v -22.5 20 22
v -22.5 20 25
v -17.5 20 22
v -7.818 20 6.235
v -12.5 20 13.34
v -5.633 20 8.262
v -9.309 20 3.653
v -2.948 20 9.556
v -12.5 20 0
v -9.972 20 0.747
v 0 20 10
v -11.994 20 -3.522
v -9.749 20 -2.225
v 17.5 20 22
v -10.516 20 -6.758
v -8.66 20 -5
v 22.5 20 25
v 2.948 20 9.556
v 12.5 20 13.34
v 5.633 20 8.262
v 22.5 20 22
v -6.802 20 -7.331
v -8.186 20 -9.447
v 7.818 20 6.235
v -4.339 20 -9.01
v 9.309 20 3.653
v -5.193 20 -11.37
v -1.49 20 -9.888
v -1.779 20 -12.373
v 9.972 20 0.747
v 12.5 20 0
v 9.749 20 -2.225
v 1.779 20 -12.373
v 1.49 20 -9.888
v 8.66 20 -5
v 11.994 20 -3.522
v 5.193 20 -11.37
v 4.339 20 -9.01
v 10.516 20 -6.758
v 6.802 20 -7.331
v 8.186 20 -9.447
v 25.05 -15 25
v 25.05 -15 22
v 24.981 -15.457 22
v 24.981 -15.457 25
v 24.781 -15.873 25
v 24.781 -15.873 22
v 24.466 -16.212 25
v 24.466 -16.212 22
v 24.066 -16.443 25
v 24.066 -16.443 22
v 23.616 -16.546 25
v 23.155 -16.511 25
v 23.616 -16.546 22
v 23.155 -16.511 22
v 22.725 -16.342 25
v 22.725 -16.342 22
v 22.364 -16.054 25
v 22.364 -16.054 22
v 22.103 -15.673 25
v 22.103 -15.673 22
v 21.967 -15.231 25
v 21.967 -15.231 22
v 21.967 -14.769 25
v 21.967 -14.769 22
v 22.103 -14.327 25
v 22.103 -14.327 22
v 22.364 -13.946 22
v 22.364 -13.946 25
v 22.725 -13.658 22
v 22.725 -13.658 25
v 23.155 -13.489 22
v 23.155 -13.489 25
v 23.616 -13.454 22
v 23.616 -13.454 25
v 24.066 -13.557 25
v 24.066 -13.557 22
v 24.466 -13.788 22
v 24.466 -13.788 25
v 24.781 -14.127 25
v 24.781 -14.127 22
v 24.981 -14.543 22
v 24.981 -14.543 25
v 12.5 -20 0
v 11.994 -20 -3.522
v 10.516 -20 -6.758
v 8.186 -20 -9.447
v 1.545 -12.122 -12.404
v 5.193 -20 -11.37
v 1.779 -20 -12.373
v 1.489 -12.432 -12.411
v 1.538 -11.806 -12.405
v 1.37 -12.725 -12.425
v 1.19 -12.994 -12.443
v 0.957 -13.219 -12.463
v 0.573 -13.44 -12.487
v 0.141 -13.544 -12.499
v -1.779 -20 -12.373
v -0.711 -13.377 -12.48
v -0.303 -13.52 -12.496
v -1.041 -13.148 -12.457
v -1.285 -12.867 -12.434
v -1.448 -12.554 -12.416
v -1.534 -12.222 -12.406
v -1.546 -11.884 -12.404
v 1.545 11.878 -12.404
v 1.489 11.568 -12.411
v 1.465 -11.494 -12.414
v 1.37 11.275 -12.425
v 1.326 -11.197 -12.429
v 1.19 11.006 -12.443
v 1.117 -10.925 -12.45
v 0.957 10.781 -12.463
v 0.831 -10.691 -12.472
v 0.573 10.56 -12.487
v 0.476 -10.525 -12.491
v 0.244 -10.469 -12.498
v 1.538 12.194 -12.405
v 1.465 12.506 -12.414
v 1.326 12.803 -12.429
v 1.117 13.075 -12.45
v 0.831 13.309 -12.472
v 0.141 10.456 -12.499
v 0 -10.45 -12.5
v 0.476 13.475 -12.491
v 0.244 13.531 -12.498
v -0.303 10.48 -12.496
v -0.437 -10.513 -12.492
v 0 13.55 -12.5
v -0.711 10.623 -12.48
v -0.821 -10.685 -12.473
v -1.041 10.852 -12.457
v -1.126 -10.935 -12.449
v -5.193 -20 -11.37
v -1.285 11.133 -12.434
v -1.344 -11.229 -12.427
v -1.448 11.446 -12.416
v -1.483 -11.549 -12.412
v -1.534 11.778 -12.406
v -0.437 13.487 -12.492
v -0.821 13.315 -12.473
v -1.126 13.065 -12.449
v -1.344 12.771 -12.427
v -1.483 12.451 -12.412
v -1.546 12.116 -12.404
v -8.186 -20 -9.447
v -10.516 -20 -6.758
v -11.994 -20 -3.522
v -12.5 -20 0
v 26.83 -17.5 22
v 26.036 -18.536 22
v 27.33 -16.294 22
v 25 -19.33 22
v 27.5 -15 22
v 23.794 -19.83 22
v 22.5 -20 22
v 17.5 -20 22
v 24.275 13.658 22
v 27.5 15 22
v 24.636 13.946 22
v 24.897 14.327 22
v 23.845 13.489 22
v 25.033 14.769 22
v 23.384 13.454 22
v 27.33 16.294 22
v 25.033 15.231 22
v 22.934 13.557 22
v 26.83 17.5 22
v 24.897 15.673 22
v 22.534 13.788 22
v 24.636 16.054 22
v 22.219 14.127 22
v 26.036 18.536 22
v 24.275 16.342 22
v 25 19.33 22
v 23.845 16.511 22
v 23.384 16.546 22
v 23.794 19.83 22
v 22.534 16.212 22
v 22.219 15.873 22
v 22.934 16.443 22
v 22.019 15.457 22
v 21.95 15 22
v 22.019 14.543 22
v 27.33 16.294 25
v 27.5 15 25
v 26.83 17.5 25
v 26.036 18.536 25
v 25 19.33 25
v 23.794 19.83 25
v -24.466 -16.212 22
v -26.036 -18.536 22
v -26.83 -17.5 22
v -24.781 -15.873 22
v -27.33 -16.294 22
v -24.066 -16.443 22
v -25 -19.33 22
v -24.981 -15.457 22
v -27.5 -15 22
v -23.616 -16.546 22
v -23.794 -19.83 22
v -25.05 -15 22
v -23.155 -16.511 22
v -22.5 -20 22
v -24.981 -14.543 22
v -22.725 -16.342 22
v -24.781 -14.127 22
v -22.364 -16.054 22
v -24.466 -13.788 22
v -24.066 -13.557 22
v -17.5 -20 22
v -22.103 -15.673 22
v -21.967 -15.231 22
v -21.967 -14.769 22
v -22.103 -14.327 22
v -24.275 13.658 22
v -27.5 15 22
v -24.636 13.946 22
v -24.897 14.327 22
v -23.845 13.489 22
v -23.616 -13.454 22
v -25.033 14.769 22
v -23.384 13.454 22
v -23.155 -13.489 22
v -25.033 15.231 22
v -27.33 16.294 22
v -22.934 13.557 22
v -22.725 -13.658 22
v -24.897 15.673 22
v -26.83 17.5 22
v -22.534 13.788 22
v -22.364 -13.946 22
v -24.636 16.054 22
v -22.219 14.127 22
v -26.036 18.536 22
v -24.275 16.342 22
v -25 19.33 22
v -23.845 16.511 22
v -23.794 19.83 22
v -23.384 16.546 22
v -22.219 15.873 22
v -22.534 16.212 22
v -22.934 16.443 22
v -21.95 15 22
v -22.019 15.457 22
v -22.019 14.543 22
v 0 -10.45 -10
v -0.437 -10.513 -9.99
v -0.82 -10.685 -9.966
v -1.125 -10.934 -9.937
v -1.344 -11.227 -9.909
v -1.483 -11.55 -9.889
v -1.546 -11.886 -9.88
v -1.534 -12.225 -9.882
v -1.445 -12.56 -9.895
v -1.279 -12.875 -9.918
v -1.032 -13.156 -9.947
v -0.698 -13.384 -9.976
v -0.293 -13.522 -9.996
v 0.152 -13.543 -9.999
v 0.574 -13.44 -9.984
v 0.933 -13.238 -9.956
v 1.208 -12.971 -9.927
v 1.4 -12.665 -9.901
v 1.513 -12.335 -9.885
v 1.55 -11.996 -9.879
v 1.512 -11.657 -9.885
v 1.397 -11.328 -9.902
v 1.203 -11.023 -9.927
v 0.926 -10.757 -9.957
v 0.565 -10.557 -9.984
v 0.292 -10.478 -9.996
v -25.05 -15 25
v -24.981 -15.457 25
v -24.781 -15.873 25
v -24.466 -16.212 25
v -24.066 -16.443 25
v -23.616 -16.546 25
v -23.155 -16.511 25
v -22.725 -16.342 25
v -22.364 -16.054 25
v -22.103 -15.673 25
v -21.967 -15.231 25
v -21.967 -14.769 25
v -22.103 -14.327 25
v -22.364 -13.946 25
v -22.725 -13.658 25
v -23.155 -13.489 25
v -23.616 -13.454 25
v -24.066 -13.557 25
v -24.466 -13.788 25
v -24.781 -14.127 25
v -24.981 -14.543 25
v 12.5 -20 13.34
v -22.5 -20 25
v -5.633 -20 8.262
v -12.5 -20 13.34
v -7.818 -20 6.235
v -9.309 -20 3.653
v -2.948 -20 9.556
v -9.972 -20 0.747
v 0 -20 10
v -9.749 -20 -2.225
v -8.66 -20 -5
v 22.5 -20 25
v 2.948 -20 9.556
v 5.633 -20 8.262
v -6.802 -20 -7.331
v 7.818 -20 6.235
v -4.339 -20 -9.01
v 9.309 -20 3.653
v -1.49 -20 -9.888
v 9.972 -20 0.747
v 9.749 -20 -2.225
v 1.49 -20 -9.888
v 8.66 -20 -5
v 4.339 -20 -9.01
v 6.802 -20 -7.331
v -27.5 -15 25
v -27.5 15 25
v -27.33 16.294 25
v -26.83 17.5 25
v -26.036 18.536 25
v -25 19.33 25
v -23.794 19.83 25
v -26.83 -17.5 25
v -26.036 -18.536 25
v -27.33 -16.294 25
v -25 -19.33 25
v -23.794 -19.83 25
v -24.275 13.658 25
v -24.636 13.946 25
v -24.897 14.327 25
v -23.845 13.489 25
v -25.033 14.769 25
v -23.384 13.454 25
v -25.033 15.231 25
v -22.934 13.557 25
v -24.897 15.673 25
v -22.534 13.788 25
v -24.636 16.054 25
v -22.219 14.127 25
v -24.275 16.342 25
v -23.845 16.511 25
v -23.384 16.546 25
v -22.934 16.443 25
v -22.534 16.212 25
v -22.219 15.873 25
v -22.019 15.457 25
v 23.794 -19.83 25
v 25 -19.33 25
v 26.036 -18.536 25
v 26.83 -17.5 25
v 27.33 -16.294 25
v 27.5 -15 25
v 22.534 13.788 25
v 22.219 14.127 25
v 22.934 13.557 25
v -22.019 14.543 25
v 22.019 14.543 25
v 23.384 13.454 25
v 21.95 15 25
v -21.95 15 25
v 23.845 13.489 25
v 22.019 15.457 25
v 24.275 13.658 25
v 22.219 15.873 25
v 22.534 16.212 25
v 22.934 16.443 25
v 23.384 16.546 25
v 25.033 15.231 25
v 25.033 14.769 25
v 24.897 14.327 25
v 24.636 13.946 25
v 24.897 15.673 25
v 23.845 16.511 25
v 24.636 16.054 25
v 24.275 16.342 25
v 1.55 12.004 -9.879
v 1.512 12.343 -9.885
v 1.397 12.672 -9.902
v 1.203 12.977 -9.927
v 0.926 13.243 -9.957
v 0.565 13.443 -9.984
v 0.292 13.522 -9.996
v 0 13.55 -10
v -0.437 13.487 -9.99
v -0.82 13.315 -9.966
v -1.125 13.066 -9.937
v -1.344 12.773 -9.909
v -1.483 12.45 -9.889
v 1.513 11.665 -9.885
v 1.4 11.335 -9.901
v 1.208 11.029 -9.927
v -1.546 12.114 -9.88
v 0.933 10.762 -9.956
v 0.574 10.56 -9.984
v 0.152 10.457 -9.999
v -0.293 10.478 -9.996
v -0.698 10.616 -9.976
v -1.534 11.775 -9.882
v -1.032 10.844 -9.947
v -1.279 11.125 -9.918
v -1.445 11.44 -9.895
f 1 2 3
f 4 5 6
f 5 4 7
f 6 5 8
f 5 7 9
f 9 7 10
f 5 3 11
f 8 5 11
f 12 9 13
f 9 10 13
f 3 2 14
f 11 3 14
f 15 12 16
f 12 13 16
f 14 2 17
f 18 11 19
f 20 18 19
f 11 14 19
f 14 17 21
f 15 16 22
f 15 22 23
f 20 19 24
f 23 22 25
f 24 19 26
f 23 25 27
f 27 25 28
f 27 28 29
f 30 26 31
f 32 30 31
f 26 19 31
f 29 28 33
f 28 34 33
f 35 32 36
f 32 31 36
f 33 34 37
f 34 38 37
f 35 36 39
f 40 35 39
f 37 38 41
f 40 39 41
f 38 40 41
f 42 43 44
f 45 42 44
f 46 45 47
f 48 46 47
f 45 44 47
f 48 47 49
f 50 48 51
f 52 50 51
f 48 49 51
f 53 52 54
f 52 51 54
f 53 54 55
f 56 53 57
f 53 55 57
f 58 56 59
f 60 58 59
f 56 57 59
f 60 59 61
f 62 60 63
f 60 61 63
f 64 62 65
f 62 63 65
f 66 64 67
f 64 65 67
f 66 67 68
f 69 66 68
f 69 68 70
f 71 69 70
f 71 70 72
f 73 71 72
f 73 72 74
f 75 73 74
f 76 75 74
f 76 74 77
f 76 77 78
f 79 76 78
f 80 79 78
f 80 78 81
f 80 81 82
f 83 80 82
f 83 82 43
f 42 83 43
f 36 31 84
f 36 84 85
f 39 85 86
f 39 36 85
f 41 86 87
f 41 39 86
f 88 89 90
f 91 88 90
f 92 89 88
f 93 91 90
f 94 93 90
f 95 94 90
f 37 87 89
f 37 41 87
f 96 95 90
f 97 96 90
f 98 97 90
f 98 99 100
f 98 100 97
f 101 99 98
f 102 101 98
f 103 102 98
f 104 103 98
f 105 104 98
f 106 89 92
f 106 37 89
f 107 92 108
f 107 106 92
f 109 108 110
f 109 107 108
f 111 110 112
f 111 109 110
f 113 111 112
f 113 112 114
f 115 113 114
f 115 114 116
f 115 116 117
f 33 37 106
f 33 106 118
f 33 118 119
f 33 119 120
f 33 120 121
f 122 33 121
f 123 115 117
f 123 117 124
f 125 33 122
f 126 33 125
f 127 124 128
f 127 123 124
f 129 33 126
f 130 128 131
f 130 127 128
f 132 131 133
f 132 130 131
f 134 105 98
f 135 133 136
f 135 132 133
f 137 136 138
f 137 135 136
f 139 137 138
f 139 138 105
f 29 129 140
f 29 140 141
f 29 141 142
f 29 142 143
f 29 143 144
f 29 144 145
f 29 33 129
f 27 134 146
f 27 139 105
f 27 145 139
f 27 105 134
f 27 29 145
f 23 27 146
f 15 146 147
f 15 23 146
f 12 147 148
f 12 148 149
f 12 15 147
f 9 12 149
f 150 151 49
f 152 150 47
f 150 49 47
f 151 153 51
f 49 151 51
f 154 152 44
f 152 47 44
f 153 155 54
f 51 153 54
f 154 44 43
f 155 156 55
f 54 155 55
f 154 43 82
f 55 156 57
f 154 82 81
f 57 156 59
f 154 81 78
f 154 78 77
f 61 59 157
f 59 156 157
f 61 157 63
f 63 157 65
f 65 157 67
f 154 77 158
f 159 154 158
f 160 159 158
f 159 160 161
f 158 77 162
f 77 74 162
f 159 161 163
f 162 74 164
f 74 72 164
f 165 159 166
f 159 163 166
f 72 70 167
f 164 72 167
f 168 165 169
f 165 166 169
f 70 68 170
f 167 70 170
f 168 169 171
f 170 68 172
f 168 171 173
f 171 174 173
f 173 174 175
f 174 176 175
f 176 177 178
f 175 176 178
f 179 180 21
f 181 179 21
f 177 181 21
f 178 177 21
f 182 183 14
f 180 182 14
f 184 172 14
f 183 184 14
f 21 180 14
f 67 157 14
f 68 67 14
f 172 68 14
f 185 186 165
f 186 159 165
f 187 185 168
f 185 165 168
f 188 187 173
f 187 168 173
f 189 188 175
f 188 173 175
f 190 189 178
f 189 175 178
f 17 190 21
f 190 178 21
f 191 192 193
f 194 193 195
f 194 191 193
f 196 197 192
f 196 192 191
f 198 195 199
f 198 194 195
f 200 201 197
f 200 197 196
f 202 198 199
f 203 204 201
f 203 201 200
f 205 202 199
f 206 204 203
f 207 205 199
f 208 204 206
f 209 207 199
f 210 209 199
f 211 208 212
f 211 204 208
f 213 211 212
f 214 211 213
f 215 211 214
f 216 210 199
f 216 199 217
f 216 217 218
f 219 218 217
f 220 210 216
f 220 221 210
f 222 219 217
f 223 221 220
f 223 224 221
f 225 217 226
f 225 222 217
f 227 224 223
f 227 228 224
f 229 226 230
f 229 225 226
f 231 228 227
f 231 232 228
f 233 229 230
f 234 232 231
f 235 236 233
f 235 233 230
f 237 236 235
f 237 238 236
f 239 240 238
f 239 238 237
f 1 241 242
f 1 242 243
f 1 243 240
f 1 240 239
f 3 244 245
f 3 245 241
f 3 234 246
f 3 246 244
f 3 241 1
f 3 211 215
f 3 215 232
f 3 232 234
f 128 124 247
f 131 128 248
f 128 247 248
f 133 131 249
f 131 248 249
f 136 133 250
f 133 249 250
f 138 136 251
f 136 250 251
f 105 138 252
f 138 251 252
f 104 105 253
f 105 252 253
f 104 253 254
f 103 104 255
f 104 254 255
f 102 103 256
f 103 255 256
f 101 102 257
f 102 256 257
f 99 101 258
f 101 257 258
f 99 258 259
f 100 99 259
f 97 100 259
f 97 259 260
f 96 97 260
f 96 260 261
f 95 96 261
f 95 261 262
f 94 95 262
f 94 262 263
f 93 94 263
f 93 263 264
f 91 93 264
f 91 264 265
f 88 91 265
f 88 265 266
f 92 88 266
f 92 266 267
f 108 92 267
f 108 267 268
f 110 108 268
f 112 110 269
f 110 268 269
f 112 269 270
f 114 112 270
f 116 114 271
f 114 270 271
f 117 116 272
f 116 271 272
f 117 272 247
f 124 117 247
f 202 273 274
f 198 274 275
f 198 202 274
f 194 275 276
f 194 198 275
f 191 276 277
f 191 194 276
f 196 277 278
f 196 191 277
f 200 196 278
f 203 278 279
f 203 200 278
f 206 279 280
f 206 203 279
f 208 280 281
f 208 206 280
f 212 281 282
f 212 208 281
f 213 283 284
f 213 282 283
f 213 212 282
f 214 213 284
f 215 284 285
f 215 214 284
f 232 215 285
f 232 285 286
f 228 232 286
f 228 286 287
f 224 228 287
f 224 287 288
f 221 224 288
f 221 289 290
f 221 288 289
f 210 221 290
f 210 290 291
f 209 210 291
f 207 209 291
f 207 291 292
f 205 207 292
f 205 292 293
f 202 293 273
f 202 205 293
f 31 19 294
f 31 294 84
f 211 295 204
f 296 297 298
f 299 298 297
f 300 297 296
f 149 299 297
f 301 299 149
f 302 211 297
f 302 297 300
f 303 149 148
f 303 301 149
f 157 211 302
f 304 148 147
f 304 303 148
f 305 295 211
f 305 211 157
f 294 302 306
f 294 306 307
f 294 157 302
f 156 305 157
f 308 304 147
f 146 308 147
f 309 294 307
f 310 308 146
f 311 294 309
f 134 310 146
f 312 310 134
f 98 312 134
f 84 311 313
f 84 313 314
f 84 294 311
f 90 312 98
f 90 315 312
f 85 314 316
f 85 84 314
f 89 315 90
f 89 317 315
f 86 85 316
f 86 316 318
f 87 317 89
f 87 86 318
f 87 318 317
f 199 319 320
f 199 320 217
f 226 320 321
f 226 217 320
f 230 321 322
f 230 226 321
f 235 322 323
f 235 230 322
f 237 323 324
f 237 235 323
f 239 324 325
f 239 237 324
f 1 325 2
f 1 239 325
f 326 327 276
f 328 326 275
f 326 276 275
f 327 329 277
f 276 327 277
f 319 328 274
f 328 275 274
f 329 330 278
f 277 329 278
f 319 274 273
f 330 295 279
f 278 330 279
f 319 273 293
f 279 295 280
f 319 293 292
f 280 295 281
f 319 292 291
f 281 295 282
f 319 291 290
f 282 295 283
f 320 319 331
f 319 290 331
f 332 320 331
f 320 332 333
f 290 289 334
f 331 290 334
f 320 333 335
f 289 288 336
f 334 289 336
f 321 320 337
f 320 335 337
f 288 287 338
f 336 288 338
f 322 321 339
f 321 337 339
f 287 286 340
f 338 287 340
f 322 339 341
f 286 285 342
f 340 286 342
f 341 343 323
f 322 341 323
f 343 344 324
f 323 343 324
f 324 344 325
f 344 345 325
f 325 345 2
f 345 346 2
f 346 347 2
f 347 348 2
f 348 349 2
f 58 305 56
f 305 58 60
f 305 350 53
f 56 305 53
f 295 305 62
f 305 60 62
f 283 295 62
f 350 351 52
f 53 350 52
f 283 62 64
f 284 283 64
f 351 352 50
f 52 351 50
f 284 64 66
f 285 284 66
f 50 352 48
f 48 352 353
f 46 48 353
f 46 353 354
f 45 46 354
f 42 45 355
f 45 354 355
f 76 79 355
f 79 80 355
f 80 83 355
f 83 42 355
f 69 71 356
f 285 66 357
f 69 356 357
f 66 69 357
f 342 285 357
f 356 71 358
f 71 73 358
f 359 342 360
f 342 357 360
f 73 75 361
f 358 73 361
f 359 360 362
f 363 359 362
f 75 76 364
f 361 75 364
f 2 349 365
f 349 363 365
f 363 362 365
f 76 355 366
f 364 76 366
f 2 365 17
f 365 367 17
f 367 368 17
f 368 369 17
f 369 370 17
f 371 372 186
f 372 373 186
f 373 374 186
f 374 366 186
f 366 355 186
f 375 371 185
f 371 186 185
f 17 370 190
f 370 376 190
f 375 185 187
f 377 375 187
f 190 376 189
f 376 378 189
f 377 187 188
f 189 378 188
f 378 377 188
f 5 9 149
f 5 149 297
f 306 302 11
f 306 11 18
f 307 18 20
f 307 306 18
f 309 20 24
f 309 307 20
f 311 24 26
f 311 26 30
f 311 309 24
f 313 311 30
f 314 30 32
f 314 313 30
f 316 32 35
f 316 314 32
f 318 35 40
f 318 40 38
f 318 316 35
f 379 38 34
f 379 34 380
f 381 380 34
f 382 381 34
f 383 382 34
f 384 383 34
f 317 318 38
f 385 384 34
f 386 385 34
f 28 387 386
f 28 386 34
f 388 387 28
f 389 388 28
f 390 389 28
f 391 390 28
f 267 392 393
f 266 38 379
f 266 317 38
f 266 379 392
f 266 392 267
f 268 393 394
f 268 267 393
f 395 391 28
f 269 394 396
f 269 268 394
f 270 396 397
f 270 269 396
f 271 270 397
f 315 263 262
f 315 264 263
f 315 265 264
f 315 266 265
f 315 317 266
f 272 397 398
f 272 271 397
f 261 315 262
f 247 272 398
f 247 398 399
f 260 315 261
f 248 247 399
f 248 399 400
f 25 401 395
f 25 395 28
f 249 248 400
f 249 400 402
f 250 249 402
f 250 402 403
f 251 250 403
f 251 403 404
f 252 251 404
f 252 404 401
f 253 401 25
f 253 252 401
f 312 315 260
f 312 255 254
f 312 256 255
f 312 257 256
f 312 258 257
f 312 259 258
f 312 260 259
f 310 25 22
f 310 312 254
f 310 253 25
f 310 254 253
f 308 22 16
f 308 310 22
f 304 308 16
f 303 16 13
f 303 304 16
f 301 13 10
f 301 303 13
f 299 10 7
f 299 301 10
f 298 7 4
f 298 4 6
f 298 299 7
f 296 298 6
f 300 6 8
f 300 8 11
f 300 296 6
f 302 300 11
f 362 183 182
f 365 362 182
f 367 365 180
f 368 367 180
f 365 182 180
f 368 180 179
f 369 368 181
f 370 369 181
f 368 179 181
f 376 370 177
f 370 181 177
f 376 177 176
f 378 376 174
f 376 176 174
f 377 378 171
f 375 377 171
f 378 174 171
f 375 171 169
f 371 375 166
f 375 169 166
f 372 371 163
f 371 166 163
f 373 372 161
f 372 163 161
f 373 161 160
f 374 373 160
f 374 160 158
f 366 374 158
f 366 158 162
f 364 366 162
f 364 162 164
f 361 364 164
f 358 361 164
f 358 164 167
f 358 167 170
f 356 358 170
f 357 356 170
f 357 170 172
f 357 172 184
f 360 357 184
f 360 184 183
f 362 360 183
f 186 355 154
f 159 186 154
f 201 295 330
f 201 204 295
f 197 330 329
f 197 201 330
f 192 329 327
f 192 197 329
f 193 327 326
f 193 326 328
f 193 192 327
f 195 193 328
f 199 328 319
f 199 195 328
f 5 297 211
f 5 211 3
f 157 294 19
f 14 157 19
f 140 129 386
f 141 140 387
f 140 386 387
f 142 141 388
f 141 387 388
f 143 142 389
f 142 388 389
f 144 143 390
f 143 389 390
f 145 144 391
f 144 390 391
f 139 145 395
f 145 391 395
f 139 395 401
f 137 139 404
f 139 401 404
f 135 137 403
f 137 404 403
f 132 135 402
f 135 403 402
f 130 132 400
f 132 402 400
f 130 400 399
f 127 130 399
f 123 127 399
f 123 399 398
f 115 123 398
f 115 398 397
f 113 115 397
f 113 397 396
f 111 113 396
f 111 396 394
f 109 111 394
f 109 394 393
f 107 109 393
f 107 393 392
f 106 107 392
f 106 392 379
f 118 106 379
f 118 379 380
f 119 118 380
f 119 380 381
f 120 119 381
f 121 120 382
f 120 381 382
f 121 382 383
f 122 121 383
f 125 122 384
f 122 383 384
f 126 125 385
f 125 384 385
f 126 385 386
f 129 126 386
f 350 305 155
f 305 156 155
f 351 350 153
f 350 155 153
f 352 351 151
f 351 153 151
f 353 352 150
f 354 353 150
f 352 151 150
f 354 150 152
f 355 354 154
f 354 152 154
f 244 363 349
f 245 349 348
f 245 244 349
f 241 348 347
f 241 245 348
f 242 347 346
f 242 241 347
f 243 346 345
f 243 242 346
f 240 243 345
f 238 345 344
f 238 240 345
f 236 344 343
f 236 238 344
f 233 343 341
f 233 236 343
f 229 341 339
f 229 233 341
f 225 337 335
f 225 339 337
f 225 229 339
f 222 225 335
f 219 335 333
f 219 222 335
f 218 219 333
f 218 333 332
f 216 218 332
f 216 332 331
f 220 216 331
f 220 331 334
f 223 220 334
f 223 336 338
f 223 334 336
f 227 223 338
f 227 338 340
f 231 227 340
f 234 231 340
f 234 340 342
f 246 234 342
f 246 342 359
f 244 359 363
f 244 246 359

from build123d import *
from OCP.BRepFilletAPI import BRepFilletAPI_MakeChamfer

# Parameters (mm, degrees)
SKETCH_1_R          = 10
EXTRUDE_1_DEPTH     = 20
SKETCH_7_R          = 1.55
CUT_EXTRUDE_2_DEPTH = 35.369317712
SKETCH_9_W          = 3
SKETCH_9_H          = 40
EXTRUDE_2_DEPTH     = 15
SKETCH_10_R         = 1.55
CUT_EXTRUDE_3_DEPTH = 49.440685517
CHAMFER_1_SIZE      = 5
CHAMFER_1_SIZE2     = 8.660254038
FILLET_1_R          = 5


with BuildPart() as part:
    # 草图1 → 凸台-拉伸1 (new, symmetric)
    with BuildSketch(Plane(origin=(0, 0, 0), x_dir=(1, 0, 0), z_dir=(0, 1, 0))):
        with BuildLine():
            Line((-12.5, -25), (12.5, -25))
            Line((12.5, -25), (12.5, 0))
            ThreePointArc((12.5, 0), (0, 12.5), (-12.5, 0))
            Line((-12.5, 0), (-12.5, -25))
        make_face()
        with Locations(Location((0, 0, 0), (0, 0, 270))):
            Circle(SKETCH_1_R, mode=Mode.SUBTRACT)
    extrude(amount=EXTRUDE_1_DEPTH, both=True)

    # 草图7 → 切除-拉伸2 (cut, through all)
    with BuildSketch(Plane.XY):
        with Locations(Location((0, -12, 0), (0, 0, 90))):
            Circle(SKETCH_7_R)
        with Locations(Location((0, 12, 0), (0, 0, 90))):
            Circle(SKETCH_7_R)
    extrude(amount=-CUT_EXTRUDE_2_DEPTH, mode=Mode.SUBTRACT)

    # 草图9 → 凸台-拉伸2 (add)
    with BuildSketch(Plane(origin=(12.5, 0, 0), x_dir=(0, 0, -1), z_dir=(1, 0, 0))):
        with Locations((-23.5, 0)):
            Rectangle(SKETCH_9_W, SKETCH_9_H)
    extrude_2 = extrude(amount=EXTRUDE_2_DEPTH)

    # 草图10 → 切除-拉伸3 (cut, through all)
    with BuildSketch(Plane(origin=(0, 0, 22), x_dir=(-1, 0, 0), z_dir=(0, 0, -1))):
        with Locations((-23.5, 15)):
            Circle(SKETCH_10_R)
        with Locations(Location((-23.5, -15, 0), (0, 0, 180))):
            Circle(SKETCH_10_R)
    cut_extrude_3 = extrude(amount=-CUT_EXTRUDE_3_DEPTH, mode=Mode.SUBTRACT)

    # 镜向6: 凸台-拉伸2, 切除-拉伸3 across plane
    add(extrude_2.mirror(Plane(origin=(0, 0, 0), x_dir=(0, 0, 1), z_dir=(1, 0, 0))))
    add(cut_extrude_3.mirror(Plane(origin=(0, 0, 0), x_dir=(0, 0, 1), z_dir=(1, 0, 0))), mode=Mode.SUBTRACT)

    # 倒角1: one chamfer whose edges measure the first distance from different faces: ONE call of the kernel's chamfer builder (chamfer() names one face for all edges)
    chamfer_1_edges_1 = [part.edges().sort_by_distance(p)[0] for p in [
        (12.5, 0, 22),
    ]]
    chamfer_1_side_1 = [part.faces().sort_by_distance(p)[0] for p in [
        (19.909671201, 0, 22),
    ]]
    chamfer_1_edges_2 = [part.edges().sort_by_distance(p)[0] for p in [
        (-12.5, 0, 22),
    ]]
    chamfer_1_side_2 = [part.faces().sort_by_distance(p)[0] for p in [
        (-19.909671201, 0, 22),
    ]]
    chamfer_1 = BRepFilletAPI_MakeChamfer(part.part.solid().wrapped)
    for e in chamfer_1_edges_1:
        chamfer_1.Add(CHAMFER_1_SIZE, CHAMFER_1_SIZE2, e.wrapped, chamfer_1_side_1[0].wrapped)  # the first distance lies on this face
    for e in chamfer_1_edges_2:
        chamfer_1.Add(CHAMFER_1_SIZE, CHAMFER_1_SIZE2, e.wrapped, chamfer_1_side_2[0].wrapped)  # the first distance lies on this face
    add(Compound.cast(chamfer_1.Shape()), mode=Mode.REPLACE)

    # 圆角1
    fillet_1_edges = [part.edges().sort_by_distance(p)[0] for p in [
        (27.5, -20, 23.5),
        (27.5, 20, 23.5),
        (-27.5, 20, 23.5),
        (-27.5, -20, 23.5),
    ]]
    fillet(fillet_1_edges, radius=FILLET_1_R)


solid = part.part
